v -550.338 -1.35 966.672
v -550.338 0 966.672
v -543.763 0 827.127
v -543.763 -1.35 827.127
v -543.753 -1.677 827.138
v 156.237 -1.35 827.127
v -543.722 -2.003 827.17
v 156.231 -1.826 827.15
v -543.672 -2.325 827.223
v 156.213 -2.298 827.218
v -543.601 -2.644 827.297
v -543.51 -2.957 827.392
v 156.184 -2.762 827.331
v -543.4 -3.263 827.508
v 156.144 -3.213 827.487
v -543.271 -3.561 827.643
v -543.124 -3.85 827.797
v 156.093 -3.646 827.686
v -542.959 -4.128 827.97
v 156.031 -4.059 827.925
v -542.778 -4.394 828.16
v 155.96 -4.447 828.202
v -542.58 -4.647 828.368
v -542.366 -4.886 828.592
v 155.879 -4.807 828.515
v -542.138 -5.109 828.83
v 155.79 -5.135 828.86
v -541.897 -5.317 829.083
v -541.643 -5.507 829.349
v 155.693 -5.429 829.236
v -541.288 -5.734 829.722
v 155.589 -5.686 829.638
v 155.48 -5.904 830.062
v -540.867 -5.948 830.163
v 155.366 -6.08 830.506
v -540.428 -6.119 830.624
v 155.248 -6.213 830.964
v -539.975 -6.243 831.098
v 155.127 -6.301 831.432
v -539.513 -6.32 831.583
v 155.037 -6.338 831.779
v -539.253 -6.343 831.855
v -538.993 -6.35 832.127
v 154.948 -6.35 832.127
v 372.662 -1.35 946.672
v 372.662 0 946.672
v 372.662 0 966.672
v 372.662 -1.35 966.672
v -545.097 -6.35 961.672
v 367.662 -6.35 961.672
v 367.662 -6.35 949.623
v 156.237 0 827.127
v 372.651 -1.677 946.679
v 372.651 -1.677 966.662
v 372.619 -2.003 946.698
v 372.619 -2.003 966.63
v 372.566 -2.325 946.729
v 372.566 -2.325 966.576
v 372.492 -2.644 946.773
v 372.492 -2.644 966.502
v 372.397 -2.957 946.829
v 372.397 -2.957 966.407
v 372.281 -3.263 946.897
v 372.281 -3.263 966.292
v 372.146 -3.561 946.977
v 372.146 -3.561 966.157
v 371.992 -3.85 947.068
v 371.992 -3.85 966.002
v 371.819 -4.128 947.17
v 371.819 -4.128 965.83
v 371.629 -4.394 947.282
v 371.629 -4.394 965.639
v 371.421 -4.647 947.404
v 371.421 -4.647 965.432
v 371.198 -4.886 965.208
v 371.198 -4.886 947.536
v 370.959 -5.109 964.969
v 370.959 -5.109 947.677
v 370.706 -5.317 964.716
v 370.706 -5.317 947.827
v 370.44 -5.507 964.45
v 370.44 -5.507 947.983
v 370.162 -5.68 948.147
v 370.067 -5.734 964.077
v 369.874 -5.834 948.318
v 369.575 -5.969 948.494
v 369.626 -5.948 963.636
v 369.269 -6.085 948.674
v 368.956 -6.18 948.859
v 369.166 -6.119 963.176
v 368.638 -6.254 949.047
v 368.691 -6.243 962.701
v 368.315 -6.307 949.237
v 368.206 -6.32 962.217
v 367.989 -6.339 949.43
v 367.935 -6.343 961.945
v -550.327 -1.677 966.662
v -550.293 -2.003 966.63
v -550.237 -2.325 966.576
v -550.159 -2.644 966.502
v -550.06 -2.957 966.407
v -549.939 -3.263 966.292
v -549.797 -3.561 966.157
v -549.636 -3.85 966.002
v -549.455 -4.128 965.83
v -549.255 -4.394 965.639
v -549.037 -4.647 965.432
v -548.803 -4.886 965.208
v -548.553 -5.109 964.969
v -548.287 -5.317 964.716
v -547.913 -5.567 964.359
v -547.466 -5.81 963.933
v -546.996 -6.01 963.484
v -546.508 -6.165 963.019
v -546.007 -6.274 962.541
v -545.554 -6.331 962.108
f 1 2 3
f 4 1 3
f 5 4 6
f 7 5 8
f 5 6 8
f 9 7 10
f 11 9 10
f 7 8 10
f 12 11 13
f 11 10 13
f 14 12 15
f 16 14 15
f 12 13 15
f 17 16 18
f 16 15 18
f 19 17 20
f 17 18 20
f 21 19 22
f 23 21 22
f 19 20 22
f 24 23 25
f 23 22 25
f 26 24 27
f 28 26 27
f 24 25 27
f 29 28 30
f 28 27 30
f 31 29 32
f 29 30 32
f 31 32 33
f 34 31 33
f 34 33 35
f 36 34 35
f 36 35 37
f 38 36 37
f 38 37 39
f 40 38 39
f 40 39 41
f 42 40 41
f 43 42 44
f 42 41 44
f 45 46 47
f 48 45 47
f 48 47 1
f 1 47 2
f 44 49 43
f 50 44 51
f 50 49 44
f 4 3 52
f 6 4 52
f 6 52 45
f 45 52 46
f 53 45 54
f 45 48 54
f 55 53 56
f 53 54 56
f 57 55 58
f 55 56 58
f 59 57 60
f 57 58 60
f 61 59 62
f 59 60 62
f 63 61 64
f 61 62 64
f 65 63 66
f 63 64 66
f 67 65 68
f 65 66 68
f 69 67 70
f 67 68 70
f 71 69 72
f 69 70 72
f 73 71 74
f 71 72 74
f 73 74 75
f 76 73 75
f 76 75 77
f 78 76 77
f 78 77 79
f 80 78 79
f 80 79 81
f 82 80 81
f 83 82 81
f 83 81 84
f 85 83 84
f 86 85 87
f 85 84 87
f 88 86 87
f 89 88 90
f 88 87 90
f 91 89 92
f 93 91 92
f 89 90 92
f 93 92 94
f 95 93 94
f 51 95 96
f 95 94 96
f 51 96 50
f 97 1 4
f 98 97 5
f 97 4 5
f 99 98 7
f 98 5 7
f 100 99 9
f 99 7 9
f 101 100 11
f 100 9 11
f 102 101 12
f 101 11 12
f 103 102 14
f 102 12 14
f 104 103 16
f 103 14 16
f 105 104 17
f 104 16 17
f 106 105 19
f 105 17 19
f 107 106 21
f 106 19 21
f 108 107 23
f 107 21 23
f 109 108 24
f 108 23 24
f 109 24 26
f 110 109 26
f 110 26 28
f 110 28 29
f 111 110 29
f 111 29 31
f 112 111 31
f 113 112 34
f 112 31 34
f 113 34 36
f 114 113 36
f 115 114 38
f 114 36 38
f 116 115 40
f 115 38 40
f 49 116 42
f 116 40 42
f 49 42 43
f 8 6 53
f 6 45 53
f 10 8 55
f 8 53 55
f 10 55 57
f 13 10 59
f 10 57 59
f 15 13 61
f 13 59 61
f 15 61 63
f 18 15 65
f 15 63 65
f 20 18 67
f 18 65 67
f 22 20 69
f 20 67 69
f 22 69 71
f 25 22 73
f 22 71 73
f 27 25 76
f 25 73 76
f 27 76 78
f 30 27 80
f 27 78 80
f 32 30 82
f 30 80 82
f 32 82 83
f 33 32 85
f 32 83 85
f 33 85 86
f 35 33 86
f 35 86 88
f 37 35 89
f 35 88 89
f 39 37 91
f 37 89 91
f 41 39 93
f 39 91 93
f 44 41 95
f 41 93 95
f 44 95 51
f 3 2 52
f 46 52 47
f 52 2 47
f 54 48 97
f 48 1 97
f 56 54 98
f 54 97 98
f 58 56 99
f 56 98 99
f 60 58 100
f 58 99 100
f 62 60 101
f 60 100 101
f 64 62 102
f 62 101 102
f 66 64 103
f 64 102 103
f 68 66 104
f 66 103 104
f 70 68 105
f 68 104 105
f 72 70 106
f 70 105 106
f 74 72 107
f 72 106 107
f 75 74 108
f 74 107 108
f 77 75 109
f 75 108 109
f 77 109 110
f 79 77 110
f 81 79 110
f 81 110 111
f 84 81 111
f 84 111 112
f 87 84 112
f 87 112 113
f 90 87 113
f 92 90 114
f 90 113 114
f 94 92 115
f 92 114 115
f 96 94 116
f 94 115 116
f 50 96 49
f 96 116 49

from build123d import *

# Parameters (mm, degrees)
F1_DEPTH = 6.35
F2_R     = 5


with BuildPart() as f1:
    # F0 (on Front) → F1 (new body)
    with BuildSketch(Plane.XZ):
        Polygon((372.662067, 966.672301), (-550.337933, 966.672301), (-543.763254, 827.127099), (156.236746, 827.127099), (372.662067, 946.672301), align=None)
    extrude(amount=F1_DEPTH)

    # F2
    f2_edges = [f1.edges().sort_by_distance(p)[0] for p in [
        (264.449407, -6.35, 886.8997),
        (372.662067, -6.35, 956.672301),
        (-88.837933, -6.35, 966.672301),
        (-547.050593, -6.35, 896.8997),
        (-193.763254, -6.35, 827.127099),
    ]]
    fillet(f2_edges, radius=F2_R)


solid = f1.part
